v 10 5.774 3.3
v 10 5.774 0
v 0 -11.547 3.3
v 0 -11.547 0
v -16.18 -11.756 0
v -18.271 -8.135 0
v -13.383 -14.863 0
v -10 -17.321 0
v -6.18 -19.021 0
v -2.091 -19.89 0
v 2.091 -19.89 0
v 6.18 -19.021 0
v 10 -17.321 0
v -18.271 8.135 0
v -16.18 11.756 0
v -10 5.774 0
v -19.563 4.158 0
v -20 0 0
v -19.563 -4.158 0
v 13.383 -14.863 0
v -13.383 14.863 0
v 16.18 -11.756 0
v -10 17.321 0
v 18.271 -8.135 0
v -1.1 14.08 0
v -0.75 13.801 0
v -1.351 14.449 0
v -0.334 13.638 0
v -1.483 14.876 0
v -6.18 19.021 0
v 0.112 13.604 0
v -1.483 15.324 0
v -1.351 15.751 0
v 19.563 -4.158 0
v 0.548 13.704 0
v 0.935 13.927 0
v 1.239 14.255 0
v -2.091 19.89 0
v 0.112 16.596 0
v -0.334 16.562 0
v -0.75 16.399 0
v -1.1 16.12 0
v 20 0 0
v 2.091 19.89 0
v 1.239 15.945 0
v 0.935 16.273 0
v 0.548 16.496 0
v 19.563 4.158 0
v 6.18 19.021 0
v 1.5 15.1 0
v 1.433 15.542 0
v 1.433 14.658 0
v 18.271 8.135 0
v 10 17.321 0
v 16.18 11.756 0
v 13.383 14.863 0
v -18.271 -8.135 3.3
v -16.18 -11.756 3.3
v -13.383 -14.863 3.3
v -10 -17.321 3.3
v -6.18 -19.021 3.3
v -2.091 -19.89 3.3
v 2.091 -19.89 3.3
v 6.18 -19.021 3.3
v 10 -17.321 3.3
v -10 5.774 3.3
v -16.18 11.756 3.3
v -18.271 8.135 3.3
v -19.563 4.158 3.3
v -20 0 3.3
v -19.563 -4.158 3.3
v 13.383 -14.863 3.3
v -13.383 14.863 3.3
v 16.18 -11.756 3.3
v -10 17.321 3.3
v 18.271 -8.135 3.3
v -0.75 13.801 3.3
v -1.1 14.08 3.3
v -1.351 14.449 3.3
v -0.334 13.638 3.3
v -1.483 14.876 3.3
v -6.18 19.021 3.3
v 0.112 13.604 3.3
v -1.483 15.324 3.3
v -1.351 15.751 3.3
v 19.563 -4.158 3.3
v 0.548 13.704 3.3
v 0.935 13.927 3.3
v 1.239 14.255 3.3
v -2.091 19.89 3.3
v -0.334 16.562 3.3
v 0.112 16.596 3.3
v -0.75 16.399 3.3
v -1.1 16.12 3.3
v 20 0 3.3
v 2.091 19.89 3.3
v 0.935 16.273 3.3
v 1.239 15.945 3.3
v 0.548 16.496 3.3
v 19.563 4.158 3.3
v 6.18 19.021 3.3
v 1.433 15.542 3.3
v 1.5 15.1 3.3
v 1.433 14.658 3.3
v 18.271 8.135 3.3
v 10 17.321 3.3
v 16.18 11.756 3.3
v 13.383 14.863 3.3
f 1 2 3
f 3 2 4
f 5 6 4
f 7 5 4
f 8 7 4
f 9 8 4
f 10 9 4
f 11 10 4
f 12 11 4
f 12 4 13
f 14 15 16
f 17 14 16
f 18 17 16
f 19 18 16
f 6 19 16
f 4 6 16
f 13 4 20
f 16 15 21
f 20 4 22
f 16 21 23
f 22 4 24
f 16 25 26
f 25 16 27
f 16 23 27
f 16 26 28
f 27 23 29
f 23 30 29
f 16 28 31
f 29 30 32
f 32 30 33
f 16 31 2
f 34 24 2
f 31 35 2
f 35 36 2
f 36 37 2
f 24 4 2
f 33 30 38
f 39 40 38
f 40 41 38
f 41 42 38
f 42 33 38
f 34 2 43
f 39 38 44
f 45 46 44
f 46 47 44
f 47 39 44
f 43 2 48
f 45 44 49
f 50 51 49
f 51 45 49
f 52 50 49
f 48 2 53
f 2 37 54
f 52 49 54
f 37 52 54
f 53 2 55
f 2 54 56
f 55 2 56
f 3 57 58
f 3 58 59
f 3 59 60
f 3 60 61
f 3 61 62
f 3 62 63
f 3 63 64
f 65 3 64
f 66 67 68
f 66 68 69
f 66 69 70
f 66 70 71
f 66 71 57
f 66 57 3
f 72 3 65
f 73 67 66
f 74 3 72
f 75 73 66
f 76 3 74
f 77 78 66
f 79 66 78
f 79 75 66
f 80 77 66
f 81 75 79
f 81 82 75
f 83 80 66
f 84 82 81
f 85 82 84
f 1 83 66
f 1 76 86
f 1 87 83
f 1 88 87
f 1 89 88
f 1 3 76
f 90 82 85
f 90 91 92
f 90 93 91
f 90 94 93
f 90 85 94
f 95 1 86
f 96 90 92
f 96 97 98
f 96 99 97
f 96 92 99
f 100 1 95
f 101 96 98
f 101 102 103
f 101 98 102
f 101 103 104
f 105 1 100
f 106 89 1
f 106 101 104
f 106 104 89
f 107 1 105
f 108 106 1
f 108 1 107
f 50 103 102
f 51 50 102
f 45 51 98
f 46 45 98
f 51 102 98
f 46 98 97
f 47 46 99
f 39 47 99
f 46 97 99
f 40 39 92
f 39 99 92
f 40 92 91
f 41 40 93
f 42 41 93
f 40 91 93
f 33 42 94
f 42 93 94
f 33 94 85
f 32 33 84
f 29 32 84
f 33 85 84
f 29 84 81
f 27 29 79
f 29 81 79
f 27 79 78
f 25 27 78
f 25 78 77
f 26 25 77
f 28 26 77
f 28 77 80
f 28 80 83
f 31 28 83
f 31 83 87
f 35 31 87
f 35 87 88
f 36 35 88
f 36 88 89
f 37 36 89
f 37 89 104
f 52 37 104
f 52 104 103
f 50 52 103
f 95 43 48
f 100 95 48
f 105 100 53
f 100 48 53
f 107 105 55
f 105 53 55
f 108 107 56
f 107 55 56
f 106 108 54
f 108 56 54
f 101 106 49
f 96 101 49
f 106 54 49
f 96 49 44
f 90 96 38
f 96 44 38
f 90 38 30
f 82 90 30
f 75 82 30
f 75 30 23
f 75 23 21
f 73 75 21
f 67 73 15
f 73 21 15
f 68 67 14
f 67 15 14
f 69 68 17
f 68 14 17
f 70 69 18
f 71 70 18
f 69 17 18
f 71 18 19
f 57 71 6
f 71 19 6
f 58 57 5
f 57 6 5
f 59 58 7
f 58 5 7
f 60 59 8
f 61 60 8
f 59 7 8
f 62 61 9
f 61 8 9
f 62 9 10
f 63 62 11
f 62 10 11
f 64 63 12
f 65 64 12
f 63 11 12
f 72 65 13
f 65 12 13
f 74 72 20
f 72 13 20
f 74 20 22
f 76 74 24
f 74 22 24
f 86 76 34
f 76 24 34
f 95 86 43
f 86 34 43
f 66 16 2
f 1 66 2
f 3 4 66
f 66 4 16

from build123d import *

# Parameters (mm, degrees)
CYLINDER_R      = 20
CYLINDER_DEPTH  = 3.3
SKETCH_R        = 1.5
POCKET_DEPTH    = 3.301
POCKET001_DEPTH = 3.301


with BuildPart() as part:
    # Cylinder → Cylinder (new body)
    with BuildSketch(Plane.XY):
        Circle(CYLINDER_R)
    extrude(amount=CYLINDER_DEPTH)

    # Sketch → Pocket (cut, through all)
    with BuildSketch(Plane.XY.offset(3.3)):
        with Locations((0, 15.1)):
            Circle(SKETCH_R)
    extrude(amount=-POCKET_DEPTH, mode=Mode.SUBTRACT)

    # Sketch001 → Pocket001 (cut, through all)
    with BuildSketch(Plane(origin=(0, 0, 0), x_dir=(1, 0, 0), z_dir=(0, 0, -1))):
        Polygon((0, 11.547005), (-10, -5.773503), (10, -5.773503), align=None)
    extrude(amount=-POCKET001_DEPTH, mode=Mode.SUBTRACT)


solid = part.part
